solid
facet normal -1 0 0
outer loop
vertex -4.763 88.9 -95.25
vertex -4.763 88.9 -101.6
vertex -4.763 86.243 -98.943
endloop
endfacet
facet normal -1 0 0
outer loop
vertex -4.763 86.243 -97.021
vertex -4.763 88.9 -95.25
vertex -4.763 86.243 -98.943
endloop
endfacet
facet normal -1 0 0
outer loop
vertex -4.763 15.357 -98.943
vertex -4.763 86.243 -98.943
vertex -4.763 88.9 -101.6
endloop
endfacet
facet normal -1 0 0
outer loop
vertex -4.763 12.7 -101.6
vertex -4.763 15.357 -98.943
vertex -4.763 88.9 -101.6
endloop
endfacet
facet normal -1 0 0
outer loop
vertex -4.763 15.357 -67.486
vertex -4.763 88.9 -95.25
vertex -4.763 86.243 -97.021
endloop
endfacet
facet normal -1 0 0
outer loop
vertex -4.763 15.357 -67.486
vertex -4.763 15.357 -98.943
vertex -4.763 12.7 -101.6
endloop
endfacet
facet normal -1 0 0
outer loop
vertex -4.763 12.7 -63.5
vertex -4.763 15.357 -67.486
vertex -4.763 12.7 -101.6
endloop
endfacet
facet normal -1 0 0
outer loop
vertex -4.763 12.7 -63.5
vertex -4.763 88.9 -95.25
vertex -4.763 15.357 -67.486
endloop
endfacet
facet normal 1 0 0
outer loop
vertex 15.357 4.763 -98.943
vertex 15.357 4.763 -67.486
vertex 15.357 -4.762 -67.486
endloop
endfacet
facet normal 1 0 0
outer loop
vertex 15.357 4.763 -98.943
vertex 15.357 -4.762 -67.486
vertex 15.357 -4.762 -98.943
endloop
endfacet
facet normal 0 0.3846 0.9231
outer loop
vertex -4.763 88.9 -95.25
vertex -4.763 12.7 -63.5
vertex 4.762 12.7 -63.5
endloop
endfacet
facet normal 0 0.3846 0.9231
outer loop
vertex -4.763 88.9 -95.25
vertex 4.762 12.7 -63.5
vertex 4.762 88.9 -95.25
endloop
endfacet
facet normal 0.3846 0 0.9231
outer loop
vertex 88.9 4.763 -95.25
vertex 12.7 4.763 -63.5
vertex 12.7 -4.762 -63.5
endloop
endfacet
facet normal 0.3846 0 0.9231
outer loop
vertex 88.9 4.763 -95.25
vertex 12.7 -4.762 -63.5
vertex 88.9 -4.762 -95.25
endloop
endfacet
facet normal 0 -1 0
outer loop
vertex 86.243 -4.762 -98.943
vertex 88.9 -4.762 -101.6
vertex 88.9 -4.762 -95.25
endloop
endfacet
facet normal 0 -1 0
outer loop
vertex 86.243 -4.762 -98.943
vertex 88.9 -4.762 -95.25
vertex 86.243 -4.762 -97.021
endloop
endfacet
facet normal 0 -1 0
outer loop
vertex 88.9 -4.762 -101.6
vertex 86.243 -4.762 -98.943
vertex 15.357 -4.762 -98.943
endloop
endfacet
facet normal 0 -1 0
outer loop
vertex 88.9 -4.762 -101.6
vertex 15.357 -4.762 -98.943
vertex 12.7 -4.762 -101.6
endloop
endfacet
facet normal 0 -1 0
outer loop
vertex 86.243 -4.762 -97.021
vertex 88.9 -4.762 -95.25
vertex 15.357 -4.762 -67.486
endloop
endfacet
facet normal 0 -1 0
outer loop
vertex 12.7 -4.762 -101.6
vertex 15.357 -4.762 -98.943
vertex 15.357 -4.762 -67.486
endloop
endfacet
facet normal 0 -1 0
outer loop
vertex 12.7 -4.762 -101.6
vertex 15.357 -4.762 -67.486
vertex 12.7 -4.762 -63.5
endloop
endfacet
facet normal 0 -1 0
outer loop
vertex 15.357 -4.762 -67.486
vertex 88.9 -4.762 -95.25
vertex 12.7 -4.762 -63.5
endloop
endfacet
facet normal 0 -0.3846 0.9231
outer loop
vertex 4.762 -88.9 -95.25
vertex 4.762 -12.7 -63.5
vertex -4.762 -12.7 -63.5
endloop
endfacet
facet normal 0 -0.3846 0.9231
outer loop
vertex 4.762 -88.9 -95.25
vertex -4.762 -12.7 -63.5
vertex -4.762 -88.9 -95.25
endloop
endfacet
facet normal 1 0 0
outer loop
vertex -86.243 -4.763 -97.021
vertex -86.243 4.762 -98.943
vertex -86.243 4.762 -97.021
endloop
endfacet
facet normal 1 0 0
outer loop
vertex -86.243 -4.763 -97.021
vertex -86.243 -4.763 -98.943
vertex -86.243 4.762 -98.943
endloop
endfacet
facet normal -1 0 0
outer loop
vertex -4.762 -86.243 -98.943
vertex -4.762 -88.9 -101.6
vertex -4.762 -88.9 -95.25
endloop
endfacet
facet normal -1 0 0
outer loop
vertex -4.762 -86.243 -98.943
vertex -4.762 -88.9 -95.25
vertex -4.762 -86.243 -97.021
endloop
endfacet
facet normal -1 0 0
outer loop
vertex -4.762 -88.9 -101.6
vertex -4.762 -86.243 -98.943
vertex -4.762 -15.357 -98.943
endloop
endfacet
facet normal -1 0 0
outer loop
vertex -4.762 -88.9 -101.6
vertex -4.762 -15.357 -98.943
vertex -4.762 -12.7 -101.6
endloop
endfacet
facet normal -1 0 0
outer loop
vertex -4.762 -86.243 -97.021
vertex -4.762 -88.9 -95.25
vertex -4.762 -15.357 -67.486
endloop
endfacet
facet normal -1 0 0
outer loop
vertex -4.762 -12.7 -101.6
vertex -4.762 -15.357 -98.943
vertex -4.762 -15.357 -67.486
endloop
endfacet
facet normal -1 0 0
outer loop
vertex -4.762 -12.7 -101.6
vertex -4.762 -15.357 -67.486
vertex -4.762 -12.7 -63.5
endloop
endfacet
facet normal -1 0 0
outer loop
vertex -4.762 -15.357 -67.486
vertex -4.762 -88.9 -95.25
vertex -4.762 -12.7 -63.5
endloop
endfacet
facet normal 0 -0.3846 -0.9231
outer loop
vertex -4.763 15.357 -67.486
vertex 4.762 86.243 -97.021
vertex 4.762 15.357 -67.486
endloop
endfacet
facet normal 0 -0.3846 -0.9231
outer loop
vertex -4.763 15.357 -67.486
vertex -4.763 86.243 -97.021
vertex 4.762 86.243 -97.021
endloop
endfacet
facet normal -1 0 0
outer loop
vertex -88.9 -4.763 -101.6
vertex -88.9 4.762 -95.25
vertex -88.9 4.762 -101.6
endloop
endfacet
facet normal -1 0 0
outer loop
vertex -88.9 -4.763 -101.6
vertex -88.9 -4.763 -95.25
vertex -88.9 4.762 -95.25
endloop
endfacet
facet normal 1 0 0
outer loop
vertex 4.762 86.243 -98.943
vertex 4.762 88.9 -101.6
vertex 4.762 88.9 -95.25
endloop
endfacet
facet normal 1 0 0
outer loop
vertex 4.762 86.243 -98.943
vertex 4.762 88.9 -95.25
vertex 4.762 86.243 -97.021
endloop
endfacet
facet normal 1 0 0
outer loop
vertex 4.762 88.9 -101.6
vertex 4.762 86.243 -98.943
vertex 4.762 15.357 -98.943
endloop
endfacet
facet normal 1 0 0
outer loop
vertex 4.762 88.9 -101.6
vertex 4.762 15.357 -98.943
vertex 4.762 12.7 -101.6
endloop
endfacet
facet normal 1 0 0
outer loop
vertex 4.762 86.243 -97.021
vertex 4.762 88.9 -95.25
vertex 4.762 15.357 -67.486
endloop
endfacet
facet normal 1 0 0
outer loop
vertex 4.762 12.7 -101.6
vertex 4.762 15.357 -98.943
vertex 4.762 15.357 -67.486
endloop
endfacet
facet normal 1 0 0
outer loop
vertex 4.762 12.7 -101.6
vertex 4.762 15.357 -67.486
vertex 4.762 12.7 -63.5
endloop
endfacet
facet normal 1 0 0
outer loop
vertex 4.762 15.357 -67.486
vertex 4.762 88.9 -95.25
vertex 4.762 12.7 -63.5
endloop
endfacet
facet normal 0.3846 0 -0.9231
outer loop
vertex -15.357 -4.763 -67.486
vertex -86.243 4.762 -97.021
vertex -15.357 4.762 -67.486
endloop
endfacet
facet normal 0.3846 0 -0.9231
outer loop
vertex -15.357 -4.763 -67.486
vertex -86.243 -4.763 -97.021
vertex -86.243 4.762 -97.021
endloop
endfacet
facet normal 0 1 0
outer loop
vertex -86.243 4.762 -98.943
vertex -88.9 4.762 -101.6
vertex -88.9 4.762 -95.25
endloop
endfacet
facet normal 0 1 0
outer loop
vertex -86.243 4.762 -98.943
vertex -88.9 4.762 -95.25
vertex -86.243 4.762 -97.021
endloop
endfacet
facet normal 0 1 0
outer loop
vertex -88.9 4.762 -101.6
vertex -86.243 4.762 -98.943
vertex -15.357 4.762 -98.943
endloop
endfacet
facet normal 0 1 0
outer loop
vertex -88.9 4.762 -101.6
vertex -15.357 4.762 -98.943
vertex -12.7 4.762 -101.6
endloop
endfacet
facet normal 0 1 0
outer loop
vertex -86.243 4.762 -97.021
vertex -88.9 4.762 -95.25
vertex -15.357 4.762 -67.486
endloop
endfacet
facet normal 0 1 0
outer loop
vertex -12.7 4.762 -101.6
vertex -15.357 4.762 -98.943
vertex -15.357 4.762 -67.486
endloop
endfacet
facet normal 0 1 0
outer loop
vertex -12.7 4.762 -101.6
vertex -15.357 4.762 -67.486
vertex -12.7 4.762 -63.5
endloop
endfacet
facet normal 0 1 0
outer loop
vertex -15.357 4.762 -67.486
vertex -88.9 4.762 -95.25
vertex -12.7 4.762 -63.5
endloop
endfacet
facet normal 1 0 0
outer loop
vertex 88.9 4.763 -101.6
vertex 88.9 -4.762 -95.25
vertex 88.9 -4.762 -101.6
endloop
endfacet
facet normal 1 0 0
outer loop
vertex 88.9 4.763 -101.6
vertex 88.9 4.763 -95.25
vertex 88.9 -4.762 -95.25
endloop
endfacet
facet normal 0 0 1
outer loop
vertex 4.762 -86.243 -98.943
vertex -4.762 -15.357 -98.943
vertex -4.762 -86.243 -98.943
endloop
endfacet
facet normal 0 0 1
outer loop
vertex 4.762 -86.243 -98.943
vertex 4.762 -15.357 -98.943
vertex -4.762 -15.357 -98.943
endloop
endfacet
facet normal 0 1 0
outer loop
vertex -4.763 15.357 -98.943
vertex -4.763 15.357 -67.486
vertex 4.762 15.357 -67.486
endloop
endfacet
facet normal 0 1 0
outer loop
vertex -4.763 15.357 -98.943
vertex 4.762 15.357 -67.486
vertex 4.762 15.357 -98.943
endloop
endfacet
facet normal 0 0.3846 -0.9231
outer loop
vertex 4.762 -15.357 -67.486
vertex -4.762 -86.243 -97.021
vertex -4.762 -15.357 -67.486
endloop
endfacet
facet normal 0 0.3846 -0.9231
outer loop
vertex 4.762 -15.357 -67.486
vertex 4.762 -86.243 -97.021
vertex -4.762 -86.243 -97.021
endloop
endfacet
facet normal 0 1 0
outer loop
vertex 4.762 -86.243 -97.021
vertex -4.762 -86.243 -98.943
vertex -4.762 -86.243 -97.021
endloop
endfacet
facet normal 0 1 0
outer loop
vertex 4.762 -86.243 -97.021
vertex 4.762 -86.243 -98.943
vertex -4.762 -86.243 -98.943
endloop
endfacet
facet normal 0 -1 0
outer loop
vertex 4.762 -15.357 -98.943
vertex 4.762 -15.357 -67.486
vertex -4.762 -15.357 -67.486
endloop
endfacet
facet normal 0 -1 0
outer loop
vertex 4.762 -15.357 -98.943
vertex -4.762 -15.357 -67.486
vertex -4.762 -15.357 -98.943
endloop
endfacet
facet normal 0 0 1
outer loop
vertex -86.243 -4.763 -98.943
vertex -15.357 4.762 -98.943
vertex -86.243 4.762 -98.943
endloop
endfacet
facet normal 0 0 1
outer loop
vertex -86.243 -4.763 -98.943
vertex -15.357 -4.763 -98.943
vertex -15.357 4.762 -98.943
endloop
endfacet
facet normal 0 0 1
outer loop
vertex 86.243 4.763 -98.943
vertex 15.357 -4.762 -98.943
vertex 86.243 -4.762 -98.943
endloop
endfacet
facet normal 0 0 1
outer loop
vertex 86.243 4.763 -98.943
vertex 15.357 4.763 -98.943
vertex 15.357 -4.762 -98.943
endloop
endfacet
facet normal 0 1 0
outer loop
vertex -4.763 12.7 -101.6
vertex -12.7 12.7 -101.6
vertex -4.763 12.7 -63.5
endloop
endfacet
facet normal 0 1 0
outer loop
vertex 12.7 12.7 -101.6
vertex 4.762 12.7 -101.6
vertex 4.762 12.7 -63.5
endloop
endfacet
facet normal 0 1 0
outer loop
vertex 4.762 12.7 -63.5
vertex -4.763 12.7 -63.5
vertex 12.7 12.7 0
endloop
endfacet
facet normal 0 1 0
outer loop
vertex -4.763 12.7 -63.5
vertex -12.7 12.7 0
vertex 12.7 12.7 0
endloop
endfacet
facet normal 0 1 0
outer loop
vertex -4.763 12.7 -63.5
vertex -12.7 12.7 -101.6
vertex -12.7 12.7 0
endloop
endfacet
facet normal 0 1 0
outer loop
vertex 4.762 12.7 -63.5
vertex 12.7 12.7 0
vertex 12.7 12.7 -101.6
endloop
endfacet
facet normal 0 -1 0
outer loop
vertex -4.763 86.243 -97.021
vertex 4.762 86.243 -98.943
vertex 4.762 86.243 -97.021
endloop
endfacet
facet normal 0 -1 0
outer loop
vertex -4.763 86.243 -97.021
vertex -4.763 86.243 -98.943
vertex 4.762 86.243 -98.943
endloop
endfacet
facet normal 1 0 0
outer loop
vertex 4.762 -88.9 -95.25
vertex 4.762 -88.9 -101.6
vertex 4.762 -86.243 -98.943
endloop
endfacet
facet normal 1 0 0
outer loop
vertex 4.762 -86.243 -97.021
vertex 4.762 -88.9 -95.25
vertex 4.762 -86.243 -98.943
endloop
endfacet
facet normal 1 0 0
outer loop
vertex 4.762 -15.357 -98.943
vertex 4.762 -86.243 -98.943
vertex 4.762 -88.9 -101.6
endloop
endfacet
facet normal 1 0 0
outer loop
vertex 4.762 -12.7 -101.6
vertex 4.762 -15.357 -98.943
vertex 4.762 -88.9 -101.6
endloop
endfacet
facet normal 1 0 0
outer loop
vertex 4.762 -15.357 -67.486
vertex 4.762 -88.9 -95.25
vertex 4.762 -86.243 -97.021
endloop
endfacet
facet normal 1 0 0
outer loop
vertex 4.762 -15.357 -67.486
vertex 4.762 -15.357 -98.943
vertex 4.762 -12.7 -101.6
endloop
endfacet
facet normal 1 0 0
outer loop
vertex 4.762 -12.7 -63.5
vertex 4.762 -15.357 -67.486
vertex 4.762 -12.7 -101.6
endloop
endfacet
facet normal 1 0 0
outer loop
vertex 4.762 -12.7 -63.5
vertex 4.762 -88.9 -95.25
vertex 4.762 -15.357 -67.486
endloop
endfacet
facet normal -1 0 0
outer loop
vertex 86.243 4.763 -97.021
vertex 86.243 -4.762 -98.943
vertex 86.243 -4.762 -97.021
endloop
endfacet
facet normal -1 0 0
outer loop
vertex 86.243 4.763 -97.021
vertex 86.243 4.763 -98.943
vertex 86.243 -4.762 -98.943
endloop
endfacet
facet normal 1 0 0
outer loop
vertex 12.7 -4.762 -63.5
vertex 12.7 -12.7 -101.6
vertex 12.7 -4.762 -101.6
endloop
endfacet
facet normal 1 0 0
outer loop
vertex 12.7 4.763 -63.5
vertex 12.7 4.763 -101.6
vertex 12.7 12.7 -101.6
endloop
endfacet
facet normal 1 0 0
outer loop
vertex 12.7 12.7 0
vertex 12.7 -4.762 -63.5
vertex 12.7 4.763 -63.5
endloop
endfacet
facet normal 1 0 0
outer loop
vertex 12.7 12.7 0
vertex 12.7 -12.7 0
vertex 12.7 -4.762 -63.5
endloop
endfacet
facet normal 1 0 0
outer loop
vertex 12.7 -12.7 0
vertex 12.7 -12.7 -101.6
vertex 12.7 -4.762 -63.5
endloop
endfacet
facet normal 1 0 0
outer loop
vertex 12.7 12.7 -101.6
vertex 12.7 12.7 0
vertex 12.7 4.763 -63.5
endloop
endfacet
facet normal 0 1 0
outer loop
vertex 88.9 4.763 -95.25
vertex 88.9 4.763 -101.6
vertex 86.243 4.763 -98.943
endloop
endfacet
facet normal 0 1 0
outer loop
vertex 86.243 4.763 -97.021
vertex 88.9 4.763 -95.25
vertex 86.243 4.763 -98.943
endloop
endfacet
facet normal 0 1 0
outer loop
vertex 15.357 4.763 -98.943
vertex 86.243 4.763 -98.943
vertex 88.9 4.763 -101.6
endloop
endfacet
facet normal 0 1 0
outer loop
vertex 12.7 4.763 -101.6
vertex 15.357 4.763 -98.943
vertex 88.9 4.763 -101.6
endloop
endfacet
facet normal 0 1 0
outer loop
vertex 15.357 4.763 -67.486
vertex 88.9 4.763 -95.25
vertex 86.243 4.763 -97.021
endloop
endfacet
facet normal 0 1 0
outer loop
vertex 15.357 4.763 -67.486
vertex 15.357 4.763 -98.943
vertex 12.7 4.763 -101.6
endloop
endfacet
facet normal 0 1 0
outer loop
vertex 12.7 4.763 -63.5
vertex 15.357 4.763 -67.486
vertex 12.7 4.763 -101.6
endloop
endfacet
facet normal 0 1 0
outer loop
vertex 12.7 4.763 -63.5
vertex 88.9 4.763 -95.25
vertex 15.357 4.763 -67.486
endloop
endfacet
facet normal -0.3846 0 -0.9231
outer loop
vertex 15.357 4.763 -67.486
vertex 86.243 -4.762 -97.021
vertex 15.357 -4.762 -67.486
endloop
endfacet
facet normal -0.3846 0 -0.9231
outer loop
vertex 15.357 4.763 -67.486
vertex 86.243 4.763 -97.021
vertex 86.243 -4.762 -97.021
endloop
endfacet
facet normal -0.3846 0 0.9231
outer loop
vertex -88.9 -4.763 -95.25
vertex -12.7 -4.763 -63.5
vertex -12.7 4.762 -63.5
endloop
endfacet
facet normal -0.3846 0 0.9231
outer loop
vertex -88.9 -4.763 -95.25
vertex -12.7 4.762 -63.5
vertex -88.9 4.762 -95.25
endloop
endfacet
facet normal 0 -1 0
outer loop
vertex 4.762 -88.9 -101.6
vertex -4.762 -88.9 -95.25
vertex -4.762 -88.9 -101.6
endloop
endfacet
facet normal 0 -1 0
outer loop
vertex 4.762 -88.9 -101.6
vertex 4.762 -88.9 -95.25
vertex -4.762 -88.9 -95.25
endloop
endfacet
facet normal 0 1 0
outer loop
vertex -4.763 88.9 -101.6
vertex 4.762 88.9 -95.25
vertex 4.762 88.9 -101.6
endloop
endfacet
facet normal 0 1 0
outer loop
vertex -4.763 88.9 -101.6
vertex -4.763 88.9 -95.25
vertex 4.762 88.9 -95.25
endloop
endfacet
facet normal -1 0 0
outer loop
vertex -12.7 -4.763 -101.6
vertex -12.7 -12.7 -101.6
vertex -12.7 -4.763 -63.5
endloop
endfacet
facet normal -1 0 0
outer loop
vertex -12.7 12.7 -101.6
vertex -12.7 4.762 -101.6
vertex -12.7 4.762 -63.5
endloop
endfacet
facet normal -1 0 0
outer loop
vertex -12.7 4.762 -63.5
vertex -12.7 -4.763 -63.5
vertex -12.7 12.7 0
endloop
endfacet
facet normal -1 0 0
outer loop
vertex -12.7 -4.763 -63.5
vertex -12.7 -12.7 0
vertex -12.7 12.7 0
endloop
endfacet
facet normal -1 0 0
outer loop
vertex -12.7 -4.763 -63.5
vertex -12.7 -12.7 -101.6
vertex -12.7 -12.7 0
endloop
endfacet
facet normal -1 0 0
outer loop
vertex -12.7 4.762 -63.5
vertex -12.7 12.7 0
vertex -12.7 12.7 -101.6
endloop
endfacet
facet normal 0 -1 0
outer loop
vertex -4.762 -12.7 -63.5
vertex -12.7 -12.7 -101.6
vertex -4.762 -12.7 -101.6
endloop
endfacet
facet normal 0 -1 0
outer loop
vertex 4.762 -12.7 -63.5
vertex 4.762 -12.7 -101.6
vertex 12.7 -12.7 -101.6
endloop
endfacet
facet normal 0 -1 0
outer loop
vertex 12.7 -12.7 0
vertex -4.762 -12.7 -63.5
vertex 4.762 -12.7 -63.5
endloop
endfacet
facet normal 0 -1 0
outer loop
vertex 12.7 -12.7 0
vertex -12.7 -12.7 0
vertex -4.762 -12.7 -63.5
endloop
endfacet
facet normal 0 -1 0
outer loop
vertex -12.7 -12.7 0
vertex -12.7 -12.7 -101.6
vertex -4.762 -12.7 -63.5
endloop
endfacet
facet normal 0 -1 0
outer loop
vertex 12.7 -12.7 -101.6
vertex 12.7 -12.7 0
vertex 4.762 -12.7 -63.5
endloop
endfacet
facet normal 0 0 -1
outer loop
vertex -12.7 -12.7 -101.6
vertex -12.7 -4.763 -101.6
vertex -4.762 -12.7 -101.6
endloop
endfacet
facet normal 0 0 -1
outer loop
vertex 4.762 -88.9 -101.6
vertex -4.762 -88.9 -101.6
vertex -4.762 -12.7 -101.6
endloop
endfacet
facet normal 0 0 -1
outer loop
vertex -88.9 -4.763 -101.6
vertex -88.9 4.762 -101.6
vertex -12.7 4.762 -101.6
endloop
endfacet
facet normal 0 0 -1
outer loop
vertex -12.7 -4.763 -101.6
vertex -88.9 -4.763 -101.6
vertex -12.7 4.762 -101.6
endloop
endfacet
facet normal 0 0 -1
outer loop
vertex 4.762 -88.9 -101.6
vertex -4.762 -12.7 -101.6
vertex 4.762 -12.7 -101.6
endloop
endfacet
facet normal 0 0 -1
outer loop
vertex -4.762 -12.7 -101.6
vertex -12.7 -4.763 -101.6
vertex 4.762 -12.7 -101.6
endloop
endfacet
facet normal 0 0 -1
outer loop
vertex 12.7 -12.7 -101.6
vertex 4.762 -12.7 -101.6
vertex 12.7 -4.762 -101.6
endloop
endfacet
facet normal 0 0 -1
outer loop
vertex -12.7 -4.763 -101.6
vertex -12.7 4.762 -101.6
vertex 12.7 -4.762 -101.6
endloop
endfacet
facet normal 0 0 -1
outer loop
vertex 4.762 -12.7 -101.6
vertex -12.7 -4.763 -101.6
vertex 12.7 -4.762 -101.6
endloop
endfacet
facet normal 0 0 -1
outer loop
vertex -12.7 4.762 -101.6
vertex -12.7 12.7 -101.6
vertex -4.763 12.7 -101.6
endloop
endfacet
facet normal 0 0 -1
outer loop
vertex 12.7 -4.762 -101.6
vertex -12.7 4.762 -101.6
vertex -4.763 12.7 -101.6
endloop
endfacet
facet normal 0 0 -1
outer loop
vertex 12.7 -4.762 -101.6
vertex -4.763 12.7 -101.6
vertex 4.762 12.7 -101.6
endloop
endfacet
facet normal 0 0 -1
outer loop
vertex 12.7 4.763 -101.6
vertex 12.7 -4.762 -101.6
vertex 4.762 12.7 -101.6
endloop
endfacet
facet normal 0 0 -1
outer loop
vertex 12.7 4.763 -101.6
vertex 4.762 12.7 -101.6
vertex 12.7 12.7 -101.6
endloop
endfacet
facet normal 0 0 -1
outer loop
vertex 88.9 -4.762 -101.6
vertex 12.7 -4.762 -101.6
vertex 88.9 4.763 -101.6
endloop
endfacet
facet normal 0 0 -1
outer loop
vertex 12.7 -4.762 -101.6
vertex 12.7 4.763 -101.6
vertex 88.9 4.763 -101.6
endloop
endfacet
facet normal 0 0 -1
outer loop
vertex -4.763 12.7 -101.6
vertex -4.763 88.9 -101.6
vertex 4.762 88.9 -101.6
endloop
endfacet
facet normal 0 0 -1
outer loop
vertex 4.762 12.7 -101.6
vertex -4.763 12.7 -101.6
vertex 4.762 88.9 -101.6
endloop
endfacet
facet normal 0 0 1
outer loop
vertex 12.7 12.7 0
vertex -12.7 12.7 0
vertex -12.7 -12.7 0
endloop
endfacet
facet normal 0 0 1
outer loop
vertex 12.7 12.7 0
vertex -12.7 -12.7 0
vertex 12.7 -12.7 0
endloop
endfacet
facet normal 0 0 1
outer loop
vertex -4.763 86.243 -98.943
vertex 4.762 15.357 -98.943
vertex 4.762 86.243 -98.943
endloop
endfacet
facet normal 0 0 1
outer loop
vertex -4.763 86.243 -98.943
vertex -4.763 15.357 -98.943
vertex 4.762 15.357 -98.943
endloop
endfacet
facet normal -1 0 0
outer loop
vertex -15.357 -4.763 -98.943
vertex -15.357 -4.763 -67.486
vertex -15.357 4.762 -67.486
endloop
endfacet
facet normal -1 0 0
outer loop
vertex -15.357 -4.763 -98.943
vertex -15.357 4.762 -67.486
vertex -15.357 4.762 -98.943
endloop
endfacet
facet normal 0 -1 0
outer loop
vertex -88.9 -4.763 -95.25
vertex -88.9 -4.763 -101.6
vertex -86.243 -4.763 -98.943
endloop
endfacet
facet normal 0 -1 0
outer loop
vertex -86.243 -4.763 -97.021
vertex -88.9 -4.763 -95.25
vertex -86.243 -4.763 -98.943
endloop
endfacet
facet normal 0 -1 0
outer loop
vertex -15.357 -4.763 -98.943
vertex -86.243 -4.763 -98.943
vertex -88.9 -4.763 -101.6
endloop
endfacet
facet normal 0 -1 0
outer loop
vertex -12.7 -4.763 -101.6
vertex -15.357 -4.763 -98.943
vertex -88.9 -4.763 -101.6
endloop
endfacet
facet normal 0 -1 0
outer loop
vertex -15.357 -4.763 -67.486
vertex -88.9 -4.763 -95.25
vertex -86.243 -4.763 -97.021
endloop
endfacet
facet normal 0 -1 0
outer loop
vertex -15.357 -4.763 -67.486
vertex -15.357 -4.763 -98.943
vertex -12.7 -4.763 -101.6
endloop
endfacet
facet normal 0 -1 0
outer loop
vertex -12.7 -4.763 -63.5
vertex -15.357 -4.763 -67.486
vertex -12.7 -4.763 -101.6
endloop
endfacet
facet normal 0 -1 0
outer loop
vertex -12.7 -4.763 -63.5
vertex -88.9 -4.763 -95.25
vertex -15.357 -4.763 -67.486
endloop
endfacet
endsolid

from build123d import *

# Parameters (mm, degrees)
F0_W     = 25.4
F0_H     = 25.4
F1_DEPTH = 101.6
F3_DEPTH = 4.7625
F5_COUNT = 4
F5_ANGLE = 270


with BuildPart() as f1:
    # F0 (on Top) → F1 (new body)
    with BuildSketch(Plane.XY):
        Rectangle(F0_W, F0_H)
    extrude(amount=-F1_DEPTH)

    # F2 (on Right) → F3 (join, symmetric)
    with BuildSketch(Plane.YZ):
        Polygon((-88.9, -101.6), (-12.7, -101.6), (-12.7, -63.5), (-88.9, -95.25), align=None)
        Polygon((-15.3570100665, -67.4855150998), (-15.3570100665, -98.9429899335), (-86.2429899335, -98.9429899335), (-86.2429899335, -97.0213400443), align=None, mode=Mode.SUBTRACT)
    extrude(amount=F3_DEPTH, both=True)

    # F5: F1 ×4 about axis
    f5_axis = Axis((0, 0, -52.7451187372), (0, 0, -1))


with BuildPart() as f1_1:
    add(f1.part)
    for i in range(1, F5_COUNT):
        add(f1.part.rotate(f5_axis, i * F5_ANGLE / (F5_COUNT - 1)))


solid = f1_1.part
